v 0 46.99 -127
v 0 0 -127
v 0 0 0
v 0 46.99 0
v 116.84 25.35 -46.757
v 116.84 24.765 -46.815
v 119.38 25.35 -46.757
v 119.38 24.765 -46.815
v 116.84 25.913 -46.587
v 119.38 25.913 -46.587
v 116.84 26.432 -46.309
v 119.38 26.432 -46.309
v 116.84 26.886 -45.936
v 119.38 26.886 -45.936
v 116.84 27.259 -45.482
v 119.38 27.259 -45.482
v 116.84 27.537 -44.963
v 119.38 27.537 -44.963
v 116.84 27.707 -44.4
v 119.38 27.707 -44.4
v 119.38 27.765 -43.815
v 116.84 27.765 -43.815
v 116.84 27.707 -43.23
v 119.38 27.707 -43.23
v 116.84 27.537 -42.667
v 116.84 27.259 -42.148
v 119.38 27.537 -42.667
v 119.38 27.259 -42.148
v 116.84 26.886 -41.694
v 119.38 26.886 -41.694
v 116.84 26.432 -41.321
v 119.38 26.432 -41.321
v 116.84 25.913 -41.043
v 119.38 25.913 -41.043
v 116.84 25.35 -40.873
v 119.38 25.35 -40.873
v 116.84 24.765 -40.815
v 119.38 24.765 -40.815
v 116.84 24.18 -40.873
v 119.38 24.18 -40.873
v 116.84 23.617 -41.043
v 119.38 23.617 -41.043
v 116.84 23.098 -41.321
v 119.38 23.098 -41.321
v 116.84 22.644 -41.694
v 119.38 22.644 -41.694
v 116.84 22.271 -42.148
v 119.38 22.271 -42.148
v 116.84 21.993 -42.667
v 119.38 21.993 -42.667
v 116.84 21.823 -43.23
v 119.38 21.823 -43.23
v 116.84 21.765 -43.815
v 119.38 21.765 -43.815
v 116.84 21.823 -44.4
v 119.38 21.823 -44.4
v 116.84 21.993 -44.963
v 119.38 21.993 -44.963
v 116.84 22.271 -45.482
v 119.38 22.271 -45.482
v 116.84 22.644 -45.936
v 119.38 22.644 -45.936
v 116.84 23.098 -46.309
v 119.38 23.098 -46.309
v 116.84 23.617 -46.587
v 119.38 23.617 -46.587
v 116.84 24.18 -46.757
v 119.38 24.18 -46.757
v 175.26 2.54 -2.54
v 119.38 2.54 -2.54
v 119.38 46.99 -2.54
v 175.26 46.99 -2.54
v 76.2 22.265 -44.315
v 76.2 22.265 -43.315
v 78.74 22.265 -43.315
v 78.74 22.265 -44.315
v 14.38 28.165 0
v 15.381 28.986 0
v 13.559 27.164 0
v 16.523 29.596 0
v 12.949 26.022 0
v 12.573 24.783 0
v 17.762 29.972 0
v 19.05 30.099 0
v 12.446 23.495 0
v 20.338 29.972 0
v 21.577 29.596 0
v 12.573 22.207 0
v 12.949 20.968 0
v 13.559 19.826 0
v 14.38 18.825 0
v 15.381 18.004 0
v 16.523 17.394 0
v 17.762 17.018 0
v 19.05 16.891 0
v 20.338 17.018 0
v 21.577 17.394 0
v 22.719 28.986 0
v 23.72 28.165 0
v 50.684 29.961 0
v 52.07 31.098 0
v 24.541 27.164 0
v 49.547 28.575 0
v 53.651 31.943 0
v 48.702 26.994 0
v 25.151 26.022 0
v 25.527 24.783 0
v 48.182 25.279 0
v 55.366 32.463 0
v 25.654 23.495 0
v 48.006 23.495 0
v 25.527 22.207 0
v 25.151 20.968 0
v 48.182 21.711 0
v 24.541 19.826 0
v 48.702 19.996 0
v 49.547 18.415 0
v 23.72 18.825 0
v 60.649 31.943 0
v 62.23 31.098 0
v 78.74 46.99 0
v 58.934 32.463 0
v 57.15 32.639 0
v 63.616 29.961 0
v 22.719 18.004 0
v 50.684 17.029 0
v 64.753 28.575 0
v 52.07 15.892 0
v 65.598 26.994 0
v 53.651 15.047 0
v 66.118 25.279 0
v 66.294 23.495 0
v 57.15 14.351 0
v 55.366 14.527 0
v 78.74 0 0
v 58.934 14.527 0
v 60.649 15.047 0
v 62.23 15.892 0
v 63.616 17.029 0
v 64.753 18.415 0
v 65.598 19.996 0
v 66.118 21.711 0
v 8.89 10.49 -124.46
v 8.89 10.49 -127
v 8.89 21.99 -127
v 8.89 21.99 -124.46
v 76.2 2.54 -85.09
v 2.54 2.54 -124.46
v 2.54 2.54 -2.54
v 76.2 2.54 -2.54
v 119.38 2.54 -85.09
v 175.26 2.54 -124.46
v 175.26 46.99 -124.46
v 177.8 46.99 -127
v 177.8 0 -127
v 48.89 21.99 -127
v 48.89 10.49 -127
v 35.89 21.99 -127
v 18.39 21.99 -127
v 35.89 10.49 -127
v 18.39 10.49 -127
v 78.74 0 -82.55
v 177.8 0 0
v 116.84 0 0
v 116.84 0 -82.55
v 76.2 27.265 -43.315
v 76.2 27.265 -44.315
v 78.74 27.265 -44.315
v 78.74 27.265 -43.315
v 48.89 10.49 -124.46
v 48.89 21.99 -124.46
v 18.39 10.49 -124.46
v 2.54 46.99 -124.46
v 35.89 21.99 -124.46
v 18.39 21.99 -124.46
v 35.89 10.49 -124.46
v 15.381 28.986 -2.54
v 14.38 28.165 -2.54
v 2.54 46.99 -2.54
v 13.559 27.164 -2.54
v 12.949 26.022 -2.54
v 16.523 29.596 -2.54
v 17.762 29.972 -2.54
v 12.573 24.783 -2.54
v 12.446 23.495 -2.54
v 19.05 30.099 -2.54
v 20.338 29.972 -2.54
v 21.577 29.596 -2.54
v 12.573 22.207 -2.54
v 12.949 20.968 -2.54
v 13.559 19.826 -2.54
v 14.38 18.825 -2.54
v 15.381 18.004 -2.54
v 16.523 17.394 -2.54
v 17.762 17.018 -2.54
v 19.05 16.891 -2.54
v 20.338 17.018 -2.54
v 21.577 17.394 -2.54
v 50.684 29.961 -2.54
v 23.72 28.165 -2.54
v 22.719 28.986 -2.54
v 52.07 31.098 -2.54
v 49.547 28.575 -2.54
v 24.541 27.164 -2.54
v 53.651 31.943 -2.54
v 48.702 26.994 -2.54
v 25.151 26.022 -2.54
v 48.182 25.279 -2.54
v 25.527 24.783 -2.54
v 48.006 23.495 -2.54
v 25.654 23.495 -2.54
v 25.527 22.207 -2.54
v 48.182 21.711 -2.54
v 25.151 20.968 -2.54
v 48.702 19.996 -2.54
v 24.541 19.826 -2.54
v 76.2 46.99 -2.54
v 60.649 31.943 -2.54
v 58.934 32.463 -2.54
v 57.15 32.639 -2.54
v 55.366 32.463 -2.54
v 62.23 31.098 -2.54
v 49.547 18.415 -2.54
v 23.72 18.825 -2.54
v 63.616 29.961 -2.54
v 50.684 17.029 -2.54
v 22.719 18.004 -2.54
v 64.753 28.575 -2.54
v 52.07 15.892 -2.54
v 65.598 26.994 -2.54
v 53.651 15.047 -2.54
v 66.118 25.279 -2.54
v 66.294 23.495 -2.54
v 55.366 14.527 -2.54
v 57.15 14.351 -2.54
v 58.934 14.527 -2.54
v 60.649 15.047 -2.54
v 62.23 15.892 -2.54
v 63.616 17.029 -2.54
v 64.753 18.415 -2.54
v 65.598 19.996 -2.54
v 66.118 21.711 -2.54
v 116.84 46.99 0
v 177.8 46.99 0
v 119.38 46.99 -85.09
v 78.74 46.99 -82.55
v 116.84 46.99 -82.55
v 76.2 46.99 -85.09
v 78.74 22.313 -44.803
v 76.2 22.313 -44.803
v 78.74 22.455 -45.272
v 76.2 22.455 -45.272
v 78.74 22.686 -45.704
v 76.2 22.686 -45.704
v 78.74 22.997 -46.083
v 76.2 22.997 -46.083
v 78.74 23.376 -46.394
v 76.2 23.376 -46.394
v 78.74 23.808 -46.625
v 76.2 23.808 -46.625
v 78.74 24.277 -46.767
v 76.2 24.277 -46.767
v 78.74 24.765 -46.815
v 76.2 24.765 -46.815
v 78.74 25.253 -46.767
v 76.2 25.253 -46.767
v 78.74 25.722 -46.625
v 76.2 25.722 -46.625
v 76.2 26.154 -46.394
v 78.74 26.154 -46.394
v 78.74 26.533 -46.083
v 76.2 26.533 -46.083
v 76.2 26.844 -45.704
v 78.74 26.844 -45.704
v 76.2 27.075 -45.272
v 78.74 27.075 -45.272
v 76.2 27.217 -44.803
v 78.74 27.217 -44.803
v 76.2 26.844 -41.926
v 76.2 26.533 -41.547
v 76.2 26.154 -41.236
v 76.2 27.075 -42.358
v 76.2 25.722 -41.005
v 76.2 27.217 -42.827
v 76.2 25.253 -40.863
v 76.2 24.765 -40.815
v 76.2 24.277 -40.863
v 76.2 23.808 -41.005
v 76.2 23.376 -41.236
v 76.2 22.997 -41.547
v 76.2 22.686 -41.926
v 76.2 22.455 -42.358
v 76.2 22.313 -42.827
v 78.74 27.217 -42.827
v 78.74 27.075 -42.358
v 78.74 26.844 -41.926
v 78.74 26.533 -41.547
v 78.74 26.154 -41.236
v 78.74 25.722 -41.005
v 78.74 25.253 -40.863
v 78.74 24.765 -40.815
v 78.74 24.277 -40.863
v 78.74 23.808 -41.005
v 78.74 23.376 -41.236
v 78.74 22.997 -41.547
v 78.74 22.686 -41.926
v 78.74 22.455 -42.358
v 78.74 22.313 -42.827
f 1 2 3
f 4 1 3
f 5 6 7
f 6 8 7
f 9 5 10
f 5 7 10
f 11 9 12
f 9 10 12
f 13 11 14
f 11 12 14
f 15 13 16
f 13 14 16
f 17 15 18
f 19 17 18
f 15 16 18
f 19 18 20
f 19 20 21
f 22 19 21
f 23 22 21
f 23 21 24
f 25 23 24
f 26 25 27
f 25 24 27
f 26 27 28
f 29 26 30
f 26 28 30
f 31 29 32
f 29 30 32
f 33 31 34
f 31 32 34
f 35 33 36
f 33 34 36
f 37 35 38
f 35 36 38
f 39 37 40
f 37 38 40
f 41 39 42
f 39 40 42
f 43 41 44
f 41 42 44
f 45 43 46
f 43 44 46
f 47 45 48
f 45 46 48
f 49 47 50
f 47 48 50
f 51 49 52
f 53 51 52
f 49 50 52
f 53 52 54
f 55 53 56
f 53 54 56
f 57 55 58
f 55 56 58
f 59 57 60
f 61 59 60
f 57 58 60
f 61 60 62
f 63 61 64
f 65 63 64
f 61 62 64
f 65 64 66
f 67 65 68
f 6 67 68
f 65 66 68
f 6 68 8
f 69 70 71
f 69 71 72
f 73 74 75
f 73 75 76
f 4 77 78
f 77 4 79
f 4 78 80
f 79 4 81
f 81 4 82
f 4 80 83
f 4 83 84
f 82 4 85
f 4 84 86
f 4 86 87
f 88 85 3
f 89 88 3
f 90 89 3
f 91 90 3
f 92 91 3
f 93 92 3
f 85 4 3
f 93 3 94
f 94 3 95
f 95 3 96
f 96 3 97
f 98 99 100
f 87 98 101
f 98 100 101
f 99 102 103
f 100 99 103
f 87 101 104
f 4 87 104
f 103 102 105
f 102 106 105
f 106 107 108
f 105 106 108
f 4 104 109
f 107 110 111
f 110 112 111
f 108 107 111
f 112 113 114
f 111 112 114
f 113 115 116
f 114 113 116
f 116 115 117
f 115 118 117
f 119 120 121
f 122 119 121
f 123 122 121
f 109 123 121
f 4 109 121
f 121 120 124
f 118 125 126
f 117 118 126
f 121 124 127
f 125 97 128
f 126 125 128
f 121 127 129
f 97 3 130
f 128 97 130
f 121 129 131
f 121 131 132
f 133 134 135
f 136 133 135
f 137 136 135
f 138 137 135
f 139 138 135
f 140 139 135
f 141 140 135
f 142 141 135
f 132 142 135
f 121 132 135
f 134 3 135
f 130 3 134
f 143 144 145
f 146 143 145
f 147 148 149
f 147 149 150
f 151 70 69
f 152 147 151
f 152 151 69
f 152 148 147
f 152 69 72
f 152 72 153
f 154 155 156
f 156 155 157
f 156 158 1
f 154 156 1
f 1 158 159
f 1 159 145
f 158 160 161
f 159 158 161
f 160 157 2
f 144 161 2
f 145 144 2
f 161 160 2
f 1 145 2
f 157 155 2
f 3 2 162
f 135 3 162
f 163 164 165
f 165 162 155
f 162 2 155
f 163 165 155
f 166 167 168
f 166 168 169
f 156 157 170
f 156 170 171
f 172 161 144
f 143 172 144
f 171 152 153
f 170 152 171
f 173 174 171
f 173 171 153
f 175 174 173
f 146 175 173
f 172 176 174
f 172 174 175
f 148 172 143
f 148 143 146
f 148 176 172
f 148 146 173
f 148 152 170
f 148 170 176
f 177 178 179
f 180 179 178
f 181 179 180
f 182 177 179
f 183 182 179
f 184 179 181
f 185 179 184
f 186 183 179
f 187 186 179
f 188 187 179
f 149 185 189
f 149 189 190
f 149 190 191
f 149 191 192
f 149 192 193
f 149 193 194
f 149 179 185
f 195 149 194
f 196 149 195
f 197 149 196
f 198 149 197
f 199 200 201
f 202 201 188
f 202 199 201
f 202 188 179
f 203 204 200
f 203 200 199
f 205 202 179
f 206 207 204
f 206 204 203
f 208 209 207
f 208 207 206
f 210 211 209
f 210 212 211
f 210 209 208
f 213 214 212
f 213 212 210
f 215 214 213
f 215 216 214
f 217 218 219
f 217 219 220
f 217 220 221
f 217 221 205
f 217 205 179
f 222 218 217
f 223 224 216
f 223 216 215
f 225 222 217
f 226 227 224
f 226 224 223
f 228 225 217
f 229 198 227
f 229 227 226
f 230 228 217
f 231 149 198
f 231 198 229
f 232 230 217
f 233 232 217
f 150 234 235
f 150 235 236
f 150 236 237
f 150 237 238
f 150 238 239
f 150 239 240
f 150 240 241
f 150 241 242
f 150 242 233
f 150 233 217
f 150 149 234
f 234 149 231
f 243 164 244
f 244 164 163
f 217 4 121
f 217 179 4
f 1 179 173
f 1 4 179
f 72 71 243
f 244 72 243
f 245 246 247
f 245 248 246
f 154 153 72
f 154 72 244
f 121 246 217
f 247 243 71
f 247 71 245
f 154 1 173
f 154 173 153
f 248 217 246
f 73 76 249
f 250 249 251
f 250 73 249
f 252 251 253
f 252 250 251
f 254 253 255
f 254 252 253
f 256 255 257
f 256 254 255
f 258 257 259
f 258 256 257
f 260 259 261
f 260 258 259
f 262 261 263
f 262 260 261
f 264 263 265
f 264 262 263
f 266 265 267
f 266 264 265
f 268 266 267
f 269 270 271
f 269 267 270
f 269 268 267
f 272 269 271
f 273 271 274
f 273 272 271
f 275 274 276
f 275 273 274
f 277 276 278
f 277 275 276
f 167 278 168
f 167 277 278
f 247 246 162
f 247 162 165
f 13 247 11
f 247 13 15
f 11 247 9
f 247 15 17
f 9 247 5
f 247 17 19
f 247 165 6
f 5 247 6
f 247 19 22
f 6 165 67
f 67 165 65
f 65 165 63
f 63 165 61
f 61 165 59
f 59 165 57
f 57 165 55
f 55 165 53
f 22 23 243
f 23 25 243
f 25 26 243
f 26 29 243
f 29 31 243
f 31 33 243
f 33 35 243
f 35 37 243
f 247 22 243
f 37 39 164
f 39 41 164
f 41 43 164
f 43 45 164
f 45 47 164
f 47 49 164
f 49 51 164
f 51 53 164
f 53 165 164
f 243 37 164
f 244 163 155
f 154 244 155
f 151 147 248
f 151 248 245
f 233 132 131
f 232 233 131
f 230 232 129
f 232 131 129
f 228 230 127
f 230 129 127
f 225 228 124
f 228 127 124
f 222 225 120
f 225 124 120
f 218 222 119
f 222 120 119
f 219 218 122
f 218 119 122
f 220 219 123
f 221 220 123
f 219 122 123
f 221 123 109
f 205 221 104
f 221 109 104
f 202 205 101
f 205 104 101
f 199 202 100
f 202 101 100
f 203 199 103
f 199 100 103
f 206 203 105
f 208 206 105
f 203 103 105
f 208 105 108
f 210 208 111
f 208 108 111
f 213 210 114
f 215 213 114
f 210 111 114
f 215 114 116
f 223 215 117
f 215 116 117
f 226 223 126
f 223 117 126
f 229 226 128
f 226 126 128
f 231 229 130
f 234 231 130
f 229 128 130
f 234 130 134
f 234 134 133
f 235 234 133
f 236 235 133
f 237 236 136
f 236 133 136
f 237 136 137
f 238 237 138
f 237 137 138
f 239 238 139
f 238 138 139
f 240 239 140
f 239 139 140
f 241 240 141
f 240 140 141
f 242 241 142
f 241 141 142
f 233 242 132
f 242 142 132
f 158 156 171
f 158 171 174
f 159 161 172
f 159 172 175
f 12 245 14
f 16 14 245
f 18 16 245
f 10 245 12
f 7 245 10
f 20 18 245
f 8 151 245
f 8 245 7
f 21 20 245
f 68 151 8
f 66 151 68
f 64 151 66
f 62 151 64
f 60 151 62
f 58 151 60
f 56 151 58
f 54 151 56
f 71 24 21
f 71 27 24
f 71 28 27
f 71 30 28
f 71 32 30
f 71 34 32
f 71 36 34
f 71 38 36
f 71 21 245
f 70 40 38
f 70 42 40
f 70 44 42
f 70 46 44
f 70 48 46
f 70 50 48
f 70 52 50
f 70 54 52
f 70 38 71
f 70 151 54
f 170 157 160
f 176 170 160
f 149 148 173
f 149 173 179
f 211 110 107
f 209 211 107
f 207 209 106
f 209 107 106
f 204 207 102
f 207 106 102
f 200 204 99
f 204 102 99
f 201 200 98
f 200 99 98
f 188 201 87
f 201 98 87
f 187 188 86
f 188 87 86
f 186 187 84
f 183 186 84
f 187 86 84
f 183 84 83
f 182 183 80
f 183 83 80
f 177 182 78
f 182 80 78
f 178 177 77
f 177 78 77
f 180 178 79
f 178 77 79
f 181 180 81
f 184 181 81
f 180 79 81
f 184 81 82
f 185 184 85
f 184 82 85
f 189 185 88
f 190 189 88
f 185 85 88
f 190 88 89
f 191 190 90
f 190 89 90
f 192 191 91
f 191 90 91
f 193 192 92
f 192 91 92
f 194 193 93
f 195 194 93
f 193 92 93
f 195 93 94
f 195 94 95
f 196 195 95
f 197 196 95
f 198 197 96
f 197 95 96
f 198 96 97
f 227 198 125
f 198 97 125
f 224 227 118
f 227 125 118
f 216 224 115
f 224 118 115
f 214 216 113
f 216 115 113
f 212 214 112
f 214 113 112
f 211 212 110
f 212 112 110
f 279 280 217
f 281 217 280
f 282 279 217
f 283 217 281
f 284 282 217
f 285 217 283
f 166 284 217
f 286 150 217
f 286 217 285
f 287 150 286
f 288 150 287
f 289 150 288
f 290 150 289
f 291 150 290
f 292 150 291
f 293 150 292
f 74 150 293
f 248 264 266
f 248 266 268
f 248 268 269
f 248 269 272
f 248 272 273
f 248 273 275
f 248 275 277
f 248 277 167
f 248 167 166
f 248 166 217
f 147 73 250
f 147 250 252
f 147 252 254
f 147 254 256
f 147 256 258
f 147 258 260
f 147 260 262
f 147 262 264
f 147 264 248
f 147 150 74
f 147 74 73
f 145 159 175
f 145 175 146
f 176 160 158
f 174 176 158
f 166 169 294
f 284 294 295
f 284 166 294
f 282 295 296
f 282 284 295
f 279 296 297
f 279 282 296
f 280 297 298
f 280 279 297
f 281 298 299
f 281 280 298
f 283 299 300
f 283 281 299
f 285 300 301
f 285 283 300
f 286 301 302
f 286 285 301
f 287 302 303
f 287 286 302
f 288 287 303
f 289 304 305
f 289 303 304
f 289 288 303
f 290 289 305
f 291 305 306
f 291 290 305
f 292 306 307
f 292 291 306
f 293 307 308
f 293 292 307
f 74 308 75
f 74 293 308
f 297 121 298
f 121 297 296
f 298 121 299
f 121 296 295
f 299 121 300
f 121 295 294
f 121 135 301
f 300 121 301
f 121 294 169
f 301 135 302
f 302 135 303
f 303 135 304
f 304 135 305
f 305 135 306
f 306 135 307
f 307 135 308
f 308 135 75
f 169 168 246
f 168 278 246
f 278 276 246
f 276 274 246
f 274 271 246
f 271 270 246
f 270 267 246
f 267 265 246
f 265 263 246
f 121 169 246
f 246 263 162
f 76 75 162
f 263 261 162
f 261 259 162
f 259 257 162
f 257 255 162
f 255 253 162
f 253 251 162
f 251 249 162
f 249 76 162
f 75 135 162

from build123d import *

# Parameters (mm, degrees)
SKETCH1_W           = 78.74
SKETCH1_H           = 127
SKETCH1_W_2         = 38.1
SKETCH1_H_2         = 44.45
BOSS_EXTRUDE1_DEPTH = 2.54
BOSS_EXTRUDE2_DEPTH = 44.45
CUT_EXTRUDE1_REACH  = 129
SKETCH3_W           = 9.5
SKETCH3_H           = 11.5
SKETCH3_W_2         = 13
CUT_EXTRUDE2_REACH  = 103.6
CUT_EXTRUDE3_REACH  = 121.38
SKETCH6_R           = 3
SKETCH29_R          = 9.144
SKETCH29_R_2        = 6.604
CUT_EXTRUDE8_DEPTH  = 2.54


with BuildPart() as part:
    # Sketch1 → Boss-Extrude1 (new body)
    with BuildSketch(Plane(origin=(0, 0, 0), x_dir=(1, 0, 0), z_dir=(0, 1, 0))):
        with Locations((39.37, 63.5)):
            Rectangle(SKETCH1_W, SKETCH1_H)
        with Locations((97.79, 104.775)):
            Rectangle(SKETCH1_W_2, SKETCH1_H_2)
        Polygon((116.84, 127), (116.84, 82.55), (116.84, 0), (177.8, 0), (177.8, 127), align=None)
    extrude(amount=BOSS_EXTRUDE1_DEPTH)

    # Sketch2 → Boss-Extrude2 (add)
    with BuildSketch(Plane(origin=(0, 2.54, 0), x_dir=(1, 0, 0), z_dir=(0, 1, 0))):
        Polygon((0, 127), (0, 0), (78.74, 0), (78.74, 82.55), (116.84, 82.55), (116.84, 0), (177.8, 0), (177.8, 127), align=None)
        Polygon((119.38, 2.54), (175.26, 2.54), (175.26, 124.46), (2.54, 124.46), (2.54, 2.54), (76.2, 2.54), (76.2, 85.09), (119.38, 85.09), align=None, mode=Mode.SUBTRACT)
    extrude(amount=BOSS_EXTRUDE2_DEPTH)

    # Sketch3 → Cut-Extrude1 (cut, up to next)
    with BuildSketch(Plane(origin=(0, 0, -127), x_dir=(-1, 0, 0), z_dir=(0, 0, -1)), mode=Mode.PRIVATE) as cut_extrude1_sk1:
        with Locations((-13.64, 16.24)):
            Rectangle(SKETCH3_W, SKETCH3_H)
    cut_extrude1_tool1 = extrude(cut_extrude1_sk1.sketch, amount=-CUT_EXTRUDE1_REACH, mode=Mode.PRIVATE) & part.part
    add(cut_extrude1_tool1.solids().sort_by_distance((13.64, 16.24, -127))[0], mode=Mode.SUBTRACT)
    # Sketch3 → Cut-Extrude1 (cut, up to next)
    with BuildSketch(Plane(origin=(0, 0, -127), x_dir=(-1, 0, 0), z_dir=(0, 0, -1)), mode=Mode.PRIVATE) as cut_extrude1_sk2:
        with Locations((-42.39, 16.24)):
            Rectangle(SKETCH3_W_2, SKETCH3_H)
    cut_extrude1_tool2 = extrude(cut_extrude1_sk2.sketch, amount=-CUT_EXTRUDE1_REACH, mode=Mode.PRIVATE) & part.part
    add(cut_extrude1_tool2.solids().sort_by_distance((42.39, 16.24, -127))[0], mode=Mode.SUBTRACT)

    # Sketch5 → Cut-Extrude2 (cut, up to next)
    with BuildSketch(Plane.ZY.offset(-76.2), mode=Mode.PRIVATE) as cut_extrude2_sk1:
        with BuildLine():
            Line((-44.315, 27.265), (-43.315, 27.265))
            ThreePointArc((-43.315, 27.265), (-40.815, 24.765), (-43.315, 22.265))
            Line((-43.315, 22.265), (-44.315, 22.265))
            ThreePointArc((-44.315, 22.265), (-46.815, 24.765), (-44.315, 27.265))
        make_face()
    cut_extrude2_tool1 = extrude(cut_extrude2_sk1.sketch, amount=-CUT_EXTRUDE2_REACH, mode=Mode.PRIVATE) & part.part
    add(cut_extrude2_tool1.solids().sort_by_distance((76.2, 24.765, -43.815))[0], mode=Mode.SUBTRACT)

    # Sketch6 → Cut-Extrude3 (cut, up to next)
    with BuildSketch(Plane(origin=(119.38, 0, 0), x_dir=(0, 0, -1), z_dir=(1, 0, 0)), mode=Mode.PRIVATE) as cut_extrude3_sk1:
        with Locations((43.815, 24.765)):
            Circle(SKETCH6_R)
    cut_extrude3_tool1 = extrude(cut_extrude3_sk1.sketch, amount=-CUT_EXTRUDE3_REACH, mode=Mode.PRIVATE) & part.part
    add(cut_extrude3_tool1.solids().sort_by_distance((119.38, 24.765, -43.815))[0], mode=Mode.SUBTRACT)

    # Sketch29 → Cut-Extrude8 (cut)
    with BuildSketch(Plane.XY):
        with Locations((57.15, 23.495)):
            Circle(SKETCH29_R)
        with Locations((19.05, 23.495)):
            Circle(SKETCH29_R_2)
    extrude(amount=-CUT_EXTRUDE8_DEPTH, mode=Mode.SUBTRACT)


solid = part.part
